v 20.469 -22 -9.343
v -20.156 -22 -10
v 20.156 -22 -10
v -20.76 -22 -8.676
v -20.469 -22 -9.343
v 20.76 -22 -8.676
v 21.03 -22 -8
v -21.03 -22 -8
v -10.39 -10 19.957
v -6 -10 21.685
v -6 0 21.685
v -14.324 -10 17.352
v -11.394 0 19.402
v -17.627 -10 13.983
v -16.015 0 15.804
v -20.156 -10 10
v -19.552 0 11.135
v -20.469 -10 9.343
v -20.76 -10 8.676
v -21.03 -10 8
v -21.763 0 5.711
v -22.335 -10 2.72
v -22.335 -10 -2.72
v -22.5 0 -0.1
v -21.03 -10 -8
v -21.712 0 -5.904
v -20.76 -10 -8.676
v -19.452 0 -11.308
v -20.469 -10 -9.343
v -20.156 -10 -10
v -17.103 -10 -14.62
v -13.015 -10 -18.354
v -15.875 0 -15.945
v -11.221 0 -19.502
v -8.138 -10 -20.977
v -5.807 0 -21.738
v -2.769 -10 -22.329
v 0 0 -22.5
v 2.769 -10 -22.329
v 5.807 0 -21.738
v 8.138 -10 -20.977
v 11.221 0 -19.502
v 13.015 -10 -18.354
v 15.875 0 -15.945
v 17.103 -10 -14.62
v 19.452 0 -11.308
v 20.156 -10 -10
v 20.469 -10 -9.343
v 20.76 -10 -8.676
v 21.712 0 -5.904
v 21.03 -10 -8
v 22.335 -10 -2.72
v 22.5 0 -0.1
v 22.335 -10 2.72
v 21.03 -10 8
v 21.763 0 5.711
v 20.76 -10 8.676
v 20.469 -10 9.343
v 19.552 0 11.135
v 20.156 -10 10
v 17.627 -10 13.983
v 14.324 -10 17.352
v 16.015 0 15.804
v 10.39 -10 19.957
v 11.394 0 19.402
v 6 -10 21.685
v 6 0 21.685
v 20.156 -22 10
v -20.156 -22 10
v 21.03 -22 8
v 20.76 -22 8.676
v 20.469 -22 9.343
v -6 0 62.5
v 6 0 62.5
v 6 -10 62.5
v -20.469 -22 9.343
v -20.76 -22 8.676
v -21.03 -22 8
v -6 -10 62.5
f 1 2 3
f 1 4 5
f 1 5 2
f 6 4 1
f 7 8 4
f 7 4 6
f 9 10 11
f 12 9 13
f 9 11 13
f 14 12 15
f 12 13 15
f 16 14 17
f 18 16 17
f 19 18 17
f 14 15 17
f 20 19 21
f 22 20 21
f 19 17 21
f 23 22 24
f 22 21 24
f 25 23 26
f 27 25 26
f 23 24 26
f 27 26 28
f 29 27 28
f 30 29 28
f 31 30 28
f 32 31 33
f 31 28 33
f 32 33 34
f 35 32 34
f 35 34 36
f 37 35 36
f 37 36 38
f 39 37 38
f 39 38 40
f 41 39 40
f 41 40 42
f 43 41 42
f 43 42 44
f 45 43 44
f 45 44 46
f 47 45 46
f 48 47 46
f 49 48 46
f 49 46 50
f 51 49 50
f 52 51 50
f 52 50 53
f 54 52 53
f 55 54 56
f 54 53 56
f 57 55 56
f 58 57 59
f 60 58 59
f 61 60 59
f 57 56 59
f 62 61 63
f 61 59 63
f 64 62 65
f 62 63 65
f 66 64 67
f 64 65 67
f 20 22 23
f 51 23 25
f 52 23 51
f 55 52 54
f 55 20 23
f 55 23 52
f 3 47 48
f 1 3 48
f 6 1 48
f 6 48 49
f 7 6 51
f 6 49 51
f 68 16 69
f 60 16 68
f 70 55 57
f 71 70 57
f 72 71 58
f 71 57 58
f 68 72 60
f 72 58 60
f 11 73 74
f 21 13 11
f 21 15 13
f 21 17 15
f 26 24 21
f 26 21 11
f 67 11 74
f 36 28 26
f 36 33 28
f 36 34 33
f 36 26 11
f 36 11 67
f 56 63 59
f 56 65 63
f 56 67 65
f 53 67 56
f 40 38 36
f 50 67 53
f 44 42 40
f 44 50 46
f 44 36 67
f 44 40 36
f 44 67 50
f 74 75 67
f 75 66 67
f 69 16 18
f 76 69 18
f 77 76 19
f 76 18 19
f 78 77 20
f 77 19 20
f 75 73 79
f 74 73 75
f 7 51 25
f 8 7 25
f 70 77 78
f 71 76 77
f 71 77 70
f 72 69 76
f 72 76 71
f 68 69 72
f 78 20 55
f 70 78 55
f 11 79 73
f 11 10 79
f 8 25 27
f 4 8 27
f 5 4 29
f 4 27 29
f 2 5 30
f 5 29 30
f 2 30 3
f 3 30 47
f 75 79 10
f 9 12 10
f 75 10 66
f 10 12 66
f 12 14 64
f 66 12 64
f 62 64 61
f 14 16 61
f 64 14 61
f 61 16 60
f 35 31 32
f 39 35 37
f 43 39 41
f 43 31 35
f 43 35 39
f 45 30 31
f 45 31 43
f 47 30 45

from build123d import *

# Parameters (mm, degrees)
F1_DEPTH  = 10
F2_W      = 40.3112887415
F2_H      = 2
F3_DEPTH  = 12
F6_DEPTH  = 10
F7_W      = 12
F7_H      = 10
F8_DEPTH  = 40
F9_W      = 59.6965367126
F9_H      = 7.6070292853
F10_DEPTH = 25


# Not quite as in the source:
# - a feature of the source that left no trace in its solid (it failed there, or was rolled back) is left out


with BuildPart() as f1:
    # F0 (on Front) → F1 (new body)
    with BuildSketch(Plane.XZ):
        with BuildLine():
            ThreePointArc((-6, 21.6852484422), (-13.6244265934, -17.9060045795), (22.5, 0))
            ThreePointArc((22.5, 0), (17.9060045795, 13.6244265934), (6, 21.6852484422))
            ThreePointArc((6, 21.6852484422), (3.0275328281, 22.2953816961), (0, 22.5))
            ThreePointArc((0, 22.5), (-3.0275328281, 22.2953816961), (-6, 21.6852484422))
        make_face()
    extrude(amount=F1_DEPTH)

    # F2 (on face) → F3 (join)
    with BuildSketch(Plane.XZ.offset(10)):
        with Locations((0, 9)):
            Rectangle(F2_W, F2_H)
        with Locations((0, -9)):
            Rectangle(F2_W, F2_H)
        with BuildLine():
            Line((20.1556443707, 10), (20.1556443707, 8))
            Line((20.1556443707, 8), (21.0297408448, 8))
            ThreePointArc((21.0297408448, 8), (20.6169587679, 9.0106054825), (20.1556443707, 10))
        make_face()
        with BuildLine():
            ThreePointArc((-20.1556443707, 10), (-20.6169587679, 9.0106054825), (-21.0297408448, 8))
            Line((-21.0297408448, 8), (-20.1556443707, 8))
            Line((-20.1556443707, 8), (-20.1556443707, 10))
        make_face()
        with BuildLine():
            Line((-20.1556443707, -8), (-21.0297408448, -8))
            ThreePointArc((-21.0297408448, -8), (-20.6169587679, -9.0106054825), (-20.1556443707, -10))
            Line((-20.1556443707, -10), (-20.1556443707, -8))
        make_face()
        with BuildLine():
            Line((21.0297408448, -8), (20.1556443707, -8))
            Line((20.1556443707, -8), (20.1556443707, -10))
            ThreePointArc((20.1556443707, -10), (20.6169587679, -9.0106054825), (21.0297408448, -8))
        make_face()
    extrude(amount=F3_DEPTH)

    # F0 (on Front) → F6 (join)
    with BuildSketch(Plane.XZ):
        with BuildLine():
            ThreePointArc((-6, 21.6852484422), (-13.6244265934, -17.9060045795), (22.5, 0))
            ThreePointArc((22.5, 0), (17.9060045795, 13.6244265934), (6, 21.6852484422))
            ThreePointArc((6, 21.6852484422), (3.0275328281, 22.2953816961), (0, 22.5))
            ThreePointArc((0, 22.5), (-3.0275328281, 22.2953816961), (-6, 21.6852484422))
        make_face()
        with BuildLine():
            ThreePointArc((0, 22.5), (3.0275328281, 22.2953816961), (6, 21.6852484422))
            Line((6, 21.6852484422), (6, 22.5))
            Line((6, 22.5), (0, 22.5))
        make_face()
        with BuildLine():
            Line((-6, 22.5), (-6, 21.6852484422))
            ThreePointArc((-6, 21.6852484422), (-3.0275328281, 22.2953816961), (0, 22.5))
            Line((0, 22.5), (-6, 22.5))
        make_face()
    extrude(amount=F6_DEPTH)

    # F7 (on face) → F8 (join)
    with BuildSketch(Plane.XY.offset(22.5)):
        with Locations((0, -5)):
            Rectangle(F7_W, F7_H)
    extrude(amount=F8_DEPTH)

    # F9 (on face) → F10 (cut)
    with BuildSketch(Plane.XY.offset(6)):
        with Locations((-0.8811633027, 3.8035146426)):
            Rectangle(F9_W, F9_H)
    extrude(amount=-F10_DEPTH, mode=Mode.SUBTRACT)


solid = f1.part
